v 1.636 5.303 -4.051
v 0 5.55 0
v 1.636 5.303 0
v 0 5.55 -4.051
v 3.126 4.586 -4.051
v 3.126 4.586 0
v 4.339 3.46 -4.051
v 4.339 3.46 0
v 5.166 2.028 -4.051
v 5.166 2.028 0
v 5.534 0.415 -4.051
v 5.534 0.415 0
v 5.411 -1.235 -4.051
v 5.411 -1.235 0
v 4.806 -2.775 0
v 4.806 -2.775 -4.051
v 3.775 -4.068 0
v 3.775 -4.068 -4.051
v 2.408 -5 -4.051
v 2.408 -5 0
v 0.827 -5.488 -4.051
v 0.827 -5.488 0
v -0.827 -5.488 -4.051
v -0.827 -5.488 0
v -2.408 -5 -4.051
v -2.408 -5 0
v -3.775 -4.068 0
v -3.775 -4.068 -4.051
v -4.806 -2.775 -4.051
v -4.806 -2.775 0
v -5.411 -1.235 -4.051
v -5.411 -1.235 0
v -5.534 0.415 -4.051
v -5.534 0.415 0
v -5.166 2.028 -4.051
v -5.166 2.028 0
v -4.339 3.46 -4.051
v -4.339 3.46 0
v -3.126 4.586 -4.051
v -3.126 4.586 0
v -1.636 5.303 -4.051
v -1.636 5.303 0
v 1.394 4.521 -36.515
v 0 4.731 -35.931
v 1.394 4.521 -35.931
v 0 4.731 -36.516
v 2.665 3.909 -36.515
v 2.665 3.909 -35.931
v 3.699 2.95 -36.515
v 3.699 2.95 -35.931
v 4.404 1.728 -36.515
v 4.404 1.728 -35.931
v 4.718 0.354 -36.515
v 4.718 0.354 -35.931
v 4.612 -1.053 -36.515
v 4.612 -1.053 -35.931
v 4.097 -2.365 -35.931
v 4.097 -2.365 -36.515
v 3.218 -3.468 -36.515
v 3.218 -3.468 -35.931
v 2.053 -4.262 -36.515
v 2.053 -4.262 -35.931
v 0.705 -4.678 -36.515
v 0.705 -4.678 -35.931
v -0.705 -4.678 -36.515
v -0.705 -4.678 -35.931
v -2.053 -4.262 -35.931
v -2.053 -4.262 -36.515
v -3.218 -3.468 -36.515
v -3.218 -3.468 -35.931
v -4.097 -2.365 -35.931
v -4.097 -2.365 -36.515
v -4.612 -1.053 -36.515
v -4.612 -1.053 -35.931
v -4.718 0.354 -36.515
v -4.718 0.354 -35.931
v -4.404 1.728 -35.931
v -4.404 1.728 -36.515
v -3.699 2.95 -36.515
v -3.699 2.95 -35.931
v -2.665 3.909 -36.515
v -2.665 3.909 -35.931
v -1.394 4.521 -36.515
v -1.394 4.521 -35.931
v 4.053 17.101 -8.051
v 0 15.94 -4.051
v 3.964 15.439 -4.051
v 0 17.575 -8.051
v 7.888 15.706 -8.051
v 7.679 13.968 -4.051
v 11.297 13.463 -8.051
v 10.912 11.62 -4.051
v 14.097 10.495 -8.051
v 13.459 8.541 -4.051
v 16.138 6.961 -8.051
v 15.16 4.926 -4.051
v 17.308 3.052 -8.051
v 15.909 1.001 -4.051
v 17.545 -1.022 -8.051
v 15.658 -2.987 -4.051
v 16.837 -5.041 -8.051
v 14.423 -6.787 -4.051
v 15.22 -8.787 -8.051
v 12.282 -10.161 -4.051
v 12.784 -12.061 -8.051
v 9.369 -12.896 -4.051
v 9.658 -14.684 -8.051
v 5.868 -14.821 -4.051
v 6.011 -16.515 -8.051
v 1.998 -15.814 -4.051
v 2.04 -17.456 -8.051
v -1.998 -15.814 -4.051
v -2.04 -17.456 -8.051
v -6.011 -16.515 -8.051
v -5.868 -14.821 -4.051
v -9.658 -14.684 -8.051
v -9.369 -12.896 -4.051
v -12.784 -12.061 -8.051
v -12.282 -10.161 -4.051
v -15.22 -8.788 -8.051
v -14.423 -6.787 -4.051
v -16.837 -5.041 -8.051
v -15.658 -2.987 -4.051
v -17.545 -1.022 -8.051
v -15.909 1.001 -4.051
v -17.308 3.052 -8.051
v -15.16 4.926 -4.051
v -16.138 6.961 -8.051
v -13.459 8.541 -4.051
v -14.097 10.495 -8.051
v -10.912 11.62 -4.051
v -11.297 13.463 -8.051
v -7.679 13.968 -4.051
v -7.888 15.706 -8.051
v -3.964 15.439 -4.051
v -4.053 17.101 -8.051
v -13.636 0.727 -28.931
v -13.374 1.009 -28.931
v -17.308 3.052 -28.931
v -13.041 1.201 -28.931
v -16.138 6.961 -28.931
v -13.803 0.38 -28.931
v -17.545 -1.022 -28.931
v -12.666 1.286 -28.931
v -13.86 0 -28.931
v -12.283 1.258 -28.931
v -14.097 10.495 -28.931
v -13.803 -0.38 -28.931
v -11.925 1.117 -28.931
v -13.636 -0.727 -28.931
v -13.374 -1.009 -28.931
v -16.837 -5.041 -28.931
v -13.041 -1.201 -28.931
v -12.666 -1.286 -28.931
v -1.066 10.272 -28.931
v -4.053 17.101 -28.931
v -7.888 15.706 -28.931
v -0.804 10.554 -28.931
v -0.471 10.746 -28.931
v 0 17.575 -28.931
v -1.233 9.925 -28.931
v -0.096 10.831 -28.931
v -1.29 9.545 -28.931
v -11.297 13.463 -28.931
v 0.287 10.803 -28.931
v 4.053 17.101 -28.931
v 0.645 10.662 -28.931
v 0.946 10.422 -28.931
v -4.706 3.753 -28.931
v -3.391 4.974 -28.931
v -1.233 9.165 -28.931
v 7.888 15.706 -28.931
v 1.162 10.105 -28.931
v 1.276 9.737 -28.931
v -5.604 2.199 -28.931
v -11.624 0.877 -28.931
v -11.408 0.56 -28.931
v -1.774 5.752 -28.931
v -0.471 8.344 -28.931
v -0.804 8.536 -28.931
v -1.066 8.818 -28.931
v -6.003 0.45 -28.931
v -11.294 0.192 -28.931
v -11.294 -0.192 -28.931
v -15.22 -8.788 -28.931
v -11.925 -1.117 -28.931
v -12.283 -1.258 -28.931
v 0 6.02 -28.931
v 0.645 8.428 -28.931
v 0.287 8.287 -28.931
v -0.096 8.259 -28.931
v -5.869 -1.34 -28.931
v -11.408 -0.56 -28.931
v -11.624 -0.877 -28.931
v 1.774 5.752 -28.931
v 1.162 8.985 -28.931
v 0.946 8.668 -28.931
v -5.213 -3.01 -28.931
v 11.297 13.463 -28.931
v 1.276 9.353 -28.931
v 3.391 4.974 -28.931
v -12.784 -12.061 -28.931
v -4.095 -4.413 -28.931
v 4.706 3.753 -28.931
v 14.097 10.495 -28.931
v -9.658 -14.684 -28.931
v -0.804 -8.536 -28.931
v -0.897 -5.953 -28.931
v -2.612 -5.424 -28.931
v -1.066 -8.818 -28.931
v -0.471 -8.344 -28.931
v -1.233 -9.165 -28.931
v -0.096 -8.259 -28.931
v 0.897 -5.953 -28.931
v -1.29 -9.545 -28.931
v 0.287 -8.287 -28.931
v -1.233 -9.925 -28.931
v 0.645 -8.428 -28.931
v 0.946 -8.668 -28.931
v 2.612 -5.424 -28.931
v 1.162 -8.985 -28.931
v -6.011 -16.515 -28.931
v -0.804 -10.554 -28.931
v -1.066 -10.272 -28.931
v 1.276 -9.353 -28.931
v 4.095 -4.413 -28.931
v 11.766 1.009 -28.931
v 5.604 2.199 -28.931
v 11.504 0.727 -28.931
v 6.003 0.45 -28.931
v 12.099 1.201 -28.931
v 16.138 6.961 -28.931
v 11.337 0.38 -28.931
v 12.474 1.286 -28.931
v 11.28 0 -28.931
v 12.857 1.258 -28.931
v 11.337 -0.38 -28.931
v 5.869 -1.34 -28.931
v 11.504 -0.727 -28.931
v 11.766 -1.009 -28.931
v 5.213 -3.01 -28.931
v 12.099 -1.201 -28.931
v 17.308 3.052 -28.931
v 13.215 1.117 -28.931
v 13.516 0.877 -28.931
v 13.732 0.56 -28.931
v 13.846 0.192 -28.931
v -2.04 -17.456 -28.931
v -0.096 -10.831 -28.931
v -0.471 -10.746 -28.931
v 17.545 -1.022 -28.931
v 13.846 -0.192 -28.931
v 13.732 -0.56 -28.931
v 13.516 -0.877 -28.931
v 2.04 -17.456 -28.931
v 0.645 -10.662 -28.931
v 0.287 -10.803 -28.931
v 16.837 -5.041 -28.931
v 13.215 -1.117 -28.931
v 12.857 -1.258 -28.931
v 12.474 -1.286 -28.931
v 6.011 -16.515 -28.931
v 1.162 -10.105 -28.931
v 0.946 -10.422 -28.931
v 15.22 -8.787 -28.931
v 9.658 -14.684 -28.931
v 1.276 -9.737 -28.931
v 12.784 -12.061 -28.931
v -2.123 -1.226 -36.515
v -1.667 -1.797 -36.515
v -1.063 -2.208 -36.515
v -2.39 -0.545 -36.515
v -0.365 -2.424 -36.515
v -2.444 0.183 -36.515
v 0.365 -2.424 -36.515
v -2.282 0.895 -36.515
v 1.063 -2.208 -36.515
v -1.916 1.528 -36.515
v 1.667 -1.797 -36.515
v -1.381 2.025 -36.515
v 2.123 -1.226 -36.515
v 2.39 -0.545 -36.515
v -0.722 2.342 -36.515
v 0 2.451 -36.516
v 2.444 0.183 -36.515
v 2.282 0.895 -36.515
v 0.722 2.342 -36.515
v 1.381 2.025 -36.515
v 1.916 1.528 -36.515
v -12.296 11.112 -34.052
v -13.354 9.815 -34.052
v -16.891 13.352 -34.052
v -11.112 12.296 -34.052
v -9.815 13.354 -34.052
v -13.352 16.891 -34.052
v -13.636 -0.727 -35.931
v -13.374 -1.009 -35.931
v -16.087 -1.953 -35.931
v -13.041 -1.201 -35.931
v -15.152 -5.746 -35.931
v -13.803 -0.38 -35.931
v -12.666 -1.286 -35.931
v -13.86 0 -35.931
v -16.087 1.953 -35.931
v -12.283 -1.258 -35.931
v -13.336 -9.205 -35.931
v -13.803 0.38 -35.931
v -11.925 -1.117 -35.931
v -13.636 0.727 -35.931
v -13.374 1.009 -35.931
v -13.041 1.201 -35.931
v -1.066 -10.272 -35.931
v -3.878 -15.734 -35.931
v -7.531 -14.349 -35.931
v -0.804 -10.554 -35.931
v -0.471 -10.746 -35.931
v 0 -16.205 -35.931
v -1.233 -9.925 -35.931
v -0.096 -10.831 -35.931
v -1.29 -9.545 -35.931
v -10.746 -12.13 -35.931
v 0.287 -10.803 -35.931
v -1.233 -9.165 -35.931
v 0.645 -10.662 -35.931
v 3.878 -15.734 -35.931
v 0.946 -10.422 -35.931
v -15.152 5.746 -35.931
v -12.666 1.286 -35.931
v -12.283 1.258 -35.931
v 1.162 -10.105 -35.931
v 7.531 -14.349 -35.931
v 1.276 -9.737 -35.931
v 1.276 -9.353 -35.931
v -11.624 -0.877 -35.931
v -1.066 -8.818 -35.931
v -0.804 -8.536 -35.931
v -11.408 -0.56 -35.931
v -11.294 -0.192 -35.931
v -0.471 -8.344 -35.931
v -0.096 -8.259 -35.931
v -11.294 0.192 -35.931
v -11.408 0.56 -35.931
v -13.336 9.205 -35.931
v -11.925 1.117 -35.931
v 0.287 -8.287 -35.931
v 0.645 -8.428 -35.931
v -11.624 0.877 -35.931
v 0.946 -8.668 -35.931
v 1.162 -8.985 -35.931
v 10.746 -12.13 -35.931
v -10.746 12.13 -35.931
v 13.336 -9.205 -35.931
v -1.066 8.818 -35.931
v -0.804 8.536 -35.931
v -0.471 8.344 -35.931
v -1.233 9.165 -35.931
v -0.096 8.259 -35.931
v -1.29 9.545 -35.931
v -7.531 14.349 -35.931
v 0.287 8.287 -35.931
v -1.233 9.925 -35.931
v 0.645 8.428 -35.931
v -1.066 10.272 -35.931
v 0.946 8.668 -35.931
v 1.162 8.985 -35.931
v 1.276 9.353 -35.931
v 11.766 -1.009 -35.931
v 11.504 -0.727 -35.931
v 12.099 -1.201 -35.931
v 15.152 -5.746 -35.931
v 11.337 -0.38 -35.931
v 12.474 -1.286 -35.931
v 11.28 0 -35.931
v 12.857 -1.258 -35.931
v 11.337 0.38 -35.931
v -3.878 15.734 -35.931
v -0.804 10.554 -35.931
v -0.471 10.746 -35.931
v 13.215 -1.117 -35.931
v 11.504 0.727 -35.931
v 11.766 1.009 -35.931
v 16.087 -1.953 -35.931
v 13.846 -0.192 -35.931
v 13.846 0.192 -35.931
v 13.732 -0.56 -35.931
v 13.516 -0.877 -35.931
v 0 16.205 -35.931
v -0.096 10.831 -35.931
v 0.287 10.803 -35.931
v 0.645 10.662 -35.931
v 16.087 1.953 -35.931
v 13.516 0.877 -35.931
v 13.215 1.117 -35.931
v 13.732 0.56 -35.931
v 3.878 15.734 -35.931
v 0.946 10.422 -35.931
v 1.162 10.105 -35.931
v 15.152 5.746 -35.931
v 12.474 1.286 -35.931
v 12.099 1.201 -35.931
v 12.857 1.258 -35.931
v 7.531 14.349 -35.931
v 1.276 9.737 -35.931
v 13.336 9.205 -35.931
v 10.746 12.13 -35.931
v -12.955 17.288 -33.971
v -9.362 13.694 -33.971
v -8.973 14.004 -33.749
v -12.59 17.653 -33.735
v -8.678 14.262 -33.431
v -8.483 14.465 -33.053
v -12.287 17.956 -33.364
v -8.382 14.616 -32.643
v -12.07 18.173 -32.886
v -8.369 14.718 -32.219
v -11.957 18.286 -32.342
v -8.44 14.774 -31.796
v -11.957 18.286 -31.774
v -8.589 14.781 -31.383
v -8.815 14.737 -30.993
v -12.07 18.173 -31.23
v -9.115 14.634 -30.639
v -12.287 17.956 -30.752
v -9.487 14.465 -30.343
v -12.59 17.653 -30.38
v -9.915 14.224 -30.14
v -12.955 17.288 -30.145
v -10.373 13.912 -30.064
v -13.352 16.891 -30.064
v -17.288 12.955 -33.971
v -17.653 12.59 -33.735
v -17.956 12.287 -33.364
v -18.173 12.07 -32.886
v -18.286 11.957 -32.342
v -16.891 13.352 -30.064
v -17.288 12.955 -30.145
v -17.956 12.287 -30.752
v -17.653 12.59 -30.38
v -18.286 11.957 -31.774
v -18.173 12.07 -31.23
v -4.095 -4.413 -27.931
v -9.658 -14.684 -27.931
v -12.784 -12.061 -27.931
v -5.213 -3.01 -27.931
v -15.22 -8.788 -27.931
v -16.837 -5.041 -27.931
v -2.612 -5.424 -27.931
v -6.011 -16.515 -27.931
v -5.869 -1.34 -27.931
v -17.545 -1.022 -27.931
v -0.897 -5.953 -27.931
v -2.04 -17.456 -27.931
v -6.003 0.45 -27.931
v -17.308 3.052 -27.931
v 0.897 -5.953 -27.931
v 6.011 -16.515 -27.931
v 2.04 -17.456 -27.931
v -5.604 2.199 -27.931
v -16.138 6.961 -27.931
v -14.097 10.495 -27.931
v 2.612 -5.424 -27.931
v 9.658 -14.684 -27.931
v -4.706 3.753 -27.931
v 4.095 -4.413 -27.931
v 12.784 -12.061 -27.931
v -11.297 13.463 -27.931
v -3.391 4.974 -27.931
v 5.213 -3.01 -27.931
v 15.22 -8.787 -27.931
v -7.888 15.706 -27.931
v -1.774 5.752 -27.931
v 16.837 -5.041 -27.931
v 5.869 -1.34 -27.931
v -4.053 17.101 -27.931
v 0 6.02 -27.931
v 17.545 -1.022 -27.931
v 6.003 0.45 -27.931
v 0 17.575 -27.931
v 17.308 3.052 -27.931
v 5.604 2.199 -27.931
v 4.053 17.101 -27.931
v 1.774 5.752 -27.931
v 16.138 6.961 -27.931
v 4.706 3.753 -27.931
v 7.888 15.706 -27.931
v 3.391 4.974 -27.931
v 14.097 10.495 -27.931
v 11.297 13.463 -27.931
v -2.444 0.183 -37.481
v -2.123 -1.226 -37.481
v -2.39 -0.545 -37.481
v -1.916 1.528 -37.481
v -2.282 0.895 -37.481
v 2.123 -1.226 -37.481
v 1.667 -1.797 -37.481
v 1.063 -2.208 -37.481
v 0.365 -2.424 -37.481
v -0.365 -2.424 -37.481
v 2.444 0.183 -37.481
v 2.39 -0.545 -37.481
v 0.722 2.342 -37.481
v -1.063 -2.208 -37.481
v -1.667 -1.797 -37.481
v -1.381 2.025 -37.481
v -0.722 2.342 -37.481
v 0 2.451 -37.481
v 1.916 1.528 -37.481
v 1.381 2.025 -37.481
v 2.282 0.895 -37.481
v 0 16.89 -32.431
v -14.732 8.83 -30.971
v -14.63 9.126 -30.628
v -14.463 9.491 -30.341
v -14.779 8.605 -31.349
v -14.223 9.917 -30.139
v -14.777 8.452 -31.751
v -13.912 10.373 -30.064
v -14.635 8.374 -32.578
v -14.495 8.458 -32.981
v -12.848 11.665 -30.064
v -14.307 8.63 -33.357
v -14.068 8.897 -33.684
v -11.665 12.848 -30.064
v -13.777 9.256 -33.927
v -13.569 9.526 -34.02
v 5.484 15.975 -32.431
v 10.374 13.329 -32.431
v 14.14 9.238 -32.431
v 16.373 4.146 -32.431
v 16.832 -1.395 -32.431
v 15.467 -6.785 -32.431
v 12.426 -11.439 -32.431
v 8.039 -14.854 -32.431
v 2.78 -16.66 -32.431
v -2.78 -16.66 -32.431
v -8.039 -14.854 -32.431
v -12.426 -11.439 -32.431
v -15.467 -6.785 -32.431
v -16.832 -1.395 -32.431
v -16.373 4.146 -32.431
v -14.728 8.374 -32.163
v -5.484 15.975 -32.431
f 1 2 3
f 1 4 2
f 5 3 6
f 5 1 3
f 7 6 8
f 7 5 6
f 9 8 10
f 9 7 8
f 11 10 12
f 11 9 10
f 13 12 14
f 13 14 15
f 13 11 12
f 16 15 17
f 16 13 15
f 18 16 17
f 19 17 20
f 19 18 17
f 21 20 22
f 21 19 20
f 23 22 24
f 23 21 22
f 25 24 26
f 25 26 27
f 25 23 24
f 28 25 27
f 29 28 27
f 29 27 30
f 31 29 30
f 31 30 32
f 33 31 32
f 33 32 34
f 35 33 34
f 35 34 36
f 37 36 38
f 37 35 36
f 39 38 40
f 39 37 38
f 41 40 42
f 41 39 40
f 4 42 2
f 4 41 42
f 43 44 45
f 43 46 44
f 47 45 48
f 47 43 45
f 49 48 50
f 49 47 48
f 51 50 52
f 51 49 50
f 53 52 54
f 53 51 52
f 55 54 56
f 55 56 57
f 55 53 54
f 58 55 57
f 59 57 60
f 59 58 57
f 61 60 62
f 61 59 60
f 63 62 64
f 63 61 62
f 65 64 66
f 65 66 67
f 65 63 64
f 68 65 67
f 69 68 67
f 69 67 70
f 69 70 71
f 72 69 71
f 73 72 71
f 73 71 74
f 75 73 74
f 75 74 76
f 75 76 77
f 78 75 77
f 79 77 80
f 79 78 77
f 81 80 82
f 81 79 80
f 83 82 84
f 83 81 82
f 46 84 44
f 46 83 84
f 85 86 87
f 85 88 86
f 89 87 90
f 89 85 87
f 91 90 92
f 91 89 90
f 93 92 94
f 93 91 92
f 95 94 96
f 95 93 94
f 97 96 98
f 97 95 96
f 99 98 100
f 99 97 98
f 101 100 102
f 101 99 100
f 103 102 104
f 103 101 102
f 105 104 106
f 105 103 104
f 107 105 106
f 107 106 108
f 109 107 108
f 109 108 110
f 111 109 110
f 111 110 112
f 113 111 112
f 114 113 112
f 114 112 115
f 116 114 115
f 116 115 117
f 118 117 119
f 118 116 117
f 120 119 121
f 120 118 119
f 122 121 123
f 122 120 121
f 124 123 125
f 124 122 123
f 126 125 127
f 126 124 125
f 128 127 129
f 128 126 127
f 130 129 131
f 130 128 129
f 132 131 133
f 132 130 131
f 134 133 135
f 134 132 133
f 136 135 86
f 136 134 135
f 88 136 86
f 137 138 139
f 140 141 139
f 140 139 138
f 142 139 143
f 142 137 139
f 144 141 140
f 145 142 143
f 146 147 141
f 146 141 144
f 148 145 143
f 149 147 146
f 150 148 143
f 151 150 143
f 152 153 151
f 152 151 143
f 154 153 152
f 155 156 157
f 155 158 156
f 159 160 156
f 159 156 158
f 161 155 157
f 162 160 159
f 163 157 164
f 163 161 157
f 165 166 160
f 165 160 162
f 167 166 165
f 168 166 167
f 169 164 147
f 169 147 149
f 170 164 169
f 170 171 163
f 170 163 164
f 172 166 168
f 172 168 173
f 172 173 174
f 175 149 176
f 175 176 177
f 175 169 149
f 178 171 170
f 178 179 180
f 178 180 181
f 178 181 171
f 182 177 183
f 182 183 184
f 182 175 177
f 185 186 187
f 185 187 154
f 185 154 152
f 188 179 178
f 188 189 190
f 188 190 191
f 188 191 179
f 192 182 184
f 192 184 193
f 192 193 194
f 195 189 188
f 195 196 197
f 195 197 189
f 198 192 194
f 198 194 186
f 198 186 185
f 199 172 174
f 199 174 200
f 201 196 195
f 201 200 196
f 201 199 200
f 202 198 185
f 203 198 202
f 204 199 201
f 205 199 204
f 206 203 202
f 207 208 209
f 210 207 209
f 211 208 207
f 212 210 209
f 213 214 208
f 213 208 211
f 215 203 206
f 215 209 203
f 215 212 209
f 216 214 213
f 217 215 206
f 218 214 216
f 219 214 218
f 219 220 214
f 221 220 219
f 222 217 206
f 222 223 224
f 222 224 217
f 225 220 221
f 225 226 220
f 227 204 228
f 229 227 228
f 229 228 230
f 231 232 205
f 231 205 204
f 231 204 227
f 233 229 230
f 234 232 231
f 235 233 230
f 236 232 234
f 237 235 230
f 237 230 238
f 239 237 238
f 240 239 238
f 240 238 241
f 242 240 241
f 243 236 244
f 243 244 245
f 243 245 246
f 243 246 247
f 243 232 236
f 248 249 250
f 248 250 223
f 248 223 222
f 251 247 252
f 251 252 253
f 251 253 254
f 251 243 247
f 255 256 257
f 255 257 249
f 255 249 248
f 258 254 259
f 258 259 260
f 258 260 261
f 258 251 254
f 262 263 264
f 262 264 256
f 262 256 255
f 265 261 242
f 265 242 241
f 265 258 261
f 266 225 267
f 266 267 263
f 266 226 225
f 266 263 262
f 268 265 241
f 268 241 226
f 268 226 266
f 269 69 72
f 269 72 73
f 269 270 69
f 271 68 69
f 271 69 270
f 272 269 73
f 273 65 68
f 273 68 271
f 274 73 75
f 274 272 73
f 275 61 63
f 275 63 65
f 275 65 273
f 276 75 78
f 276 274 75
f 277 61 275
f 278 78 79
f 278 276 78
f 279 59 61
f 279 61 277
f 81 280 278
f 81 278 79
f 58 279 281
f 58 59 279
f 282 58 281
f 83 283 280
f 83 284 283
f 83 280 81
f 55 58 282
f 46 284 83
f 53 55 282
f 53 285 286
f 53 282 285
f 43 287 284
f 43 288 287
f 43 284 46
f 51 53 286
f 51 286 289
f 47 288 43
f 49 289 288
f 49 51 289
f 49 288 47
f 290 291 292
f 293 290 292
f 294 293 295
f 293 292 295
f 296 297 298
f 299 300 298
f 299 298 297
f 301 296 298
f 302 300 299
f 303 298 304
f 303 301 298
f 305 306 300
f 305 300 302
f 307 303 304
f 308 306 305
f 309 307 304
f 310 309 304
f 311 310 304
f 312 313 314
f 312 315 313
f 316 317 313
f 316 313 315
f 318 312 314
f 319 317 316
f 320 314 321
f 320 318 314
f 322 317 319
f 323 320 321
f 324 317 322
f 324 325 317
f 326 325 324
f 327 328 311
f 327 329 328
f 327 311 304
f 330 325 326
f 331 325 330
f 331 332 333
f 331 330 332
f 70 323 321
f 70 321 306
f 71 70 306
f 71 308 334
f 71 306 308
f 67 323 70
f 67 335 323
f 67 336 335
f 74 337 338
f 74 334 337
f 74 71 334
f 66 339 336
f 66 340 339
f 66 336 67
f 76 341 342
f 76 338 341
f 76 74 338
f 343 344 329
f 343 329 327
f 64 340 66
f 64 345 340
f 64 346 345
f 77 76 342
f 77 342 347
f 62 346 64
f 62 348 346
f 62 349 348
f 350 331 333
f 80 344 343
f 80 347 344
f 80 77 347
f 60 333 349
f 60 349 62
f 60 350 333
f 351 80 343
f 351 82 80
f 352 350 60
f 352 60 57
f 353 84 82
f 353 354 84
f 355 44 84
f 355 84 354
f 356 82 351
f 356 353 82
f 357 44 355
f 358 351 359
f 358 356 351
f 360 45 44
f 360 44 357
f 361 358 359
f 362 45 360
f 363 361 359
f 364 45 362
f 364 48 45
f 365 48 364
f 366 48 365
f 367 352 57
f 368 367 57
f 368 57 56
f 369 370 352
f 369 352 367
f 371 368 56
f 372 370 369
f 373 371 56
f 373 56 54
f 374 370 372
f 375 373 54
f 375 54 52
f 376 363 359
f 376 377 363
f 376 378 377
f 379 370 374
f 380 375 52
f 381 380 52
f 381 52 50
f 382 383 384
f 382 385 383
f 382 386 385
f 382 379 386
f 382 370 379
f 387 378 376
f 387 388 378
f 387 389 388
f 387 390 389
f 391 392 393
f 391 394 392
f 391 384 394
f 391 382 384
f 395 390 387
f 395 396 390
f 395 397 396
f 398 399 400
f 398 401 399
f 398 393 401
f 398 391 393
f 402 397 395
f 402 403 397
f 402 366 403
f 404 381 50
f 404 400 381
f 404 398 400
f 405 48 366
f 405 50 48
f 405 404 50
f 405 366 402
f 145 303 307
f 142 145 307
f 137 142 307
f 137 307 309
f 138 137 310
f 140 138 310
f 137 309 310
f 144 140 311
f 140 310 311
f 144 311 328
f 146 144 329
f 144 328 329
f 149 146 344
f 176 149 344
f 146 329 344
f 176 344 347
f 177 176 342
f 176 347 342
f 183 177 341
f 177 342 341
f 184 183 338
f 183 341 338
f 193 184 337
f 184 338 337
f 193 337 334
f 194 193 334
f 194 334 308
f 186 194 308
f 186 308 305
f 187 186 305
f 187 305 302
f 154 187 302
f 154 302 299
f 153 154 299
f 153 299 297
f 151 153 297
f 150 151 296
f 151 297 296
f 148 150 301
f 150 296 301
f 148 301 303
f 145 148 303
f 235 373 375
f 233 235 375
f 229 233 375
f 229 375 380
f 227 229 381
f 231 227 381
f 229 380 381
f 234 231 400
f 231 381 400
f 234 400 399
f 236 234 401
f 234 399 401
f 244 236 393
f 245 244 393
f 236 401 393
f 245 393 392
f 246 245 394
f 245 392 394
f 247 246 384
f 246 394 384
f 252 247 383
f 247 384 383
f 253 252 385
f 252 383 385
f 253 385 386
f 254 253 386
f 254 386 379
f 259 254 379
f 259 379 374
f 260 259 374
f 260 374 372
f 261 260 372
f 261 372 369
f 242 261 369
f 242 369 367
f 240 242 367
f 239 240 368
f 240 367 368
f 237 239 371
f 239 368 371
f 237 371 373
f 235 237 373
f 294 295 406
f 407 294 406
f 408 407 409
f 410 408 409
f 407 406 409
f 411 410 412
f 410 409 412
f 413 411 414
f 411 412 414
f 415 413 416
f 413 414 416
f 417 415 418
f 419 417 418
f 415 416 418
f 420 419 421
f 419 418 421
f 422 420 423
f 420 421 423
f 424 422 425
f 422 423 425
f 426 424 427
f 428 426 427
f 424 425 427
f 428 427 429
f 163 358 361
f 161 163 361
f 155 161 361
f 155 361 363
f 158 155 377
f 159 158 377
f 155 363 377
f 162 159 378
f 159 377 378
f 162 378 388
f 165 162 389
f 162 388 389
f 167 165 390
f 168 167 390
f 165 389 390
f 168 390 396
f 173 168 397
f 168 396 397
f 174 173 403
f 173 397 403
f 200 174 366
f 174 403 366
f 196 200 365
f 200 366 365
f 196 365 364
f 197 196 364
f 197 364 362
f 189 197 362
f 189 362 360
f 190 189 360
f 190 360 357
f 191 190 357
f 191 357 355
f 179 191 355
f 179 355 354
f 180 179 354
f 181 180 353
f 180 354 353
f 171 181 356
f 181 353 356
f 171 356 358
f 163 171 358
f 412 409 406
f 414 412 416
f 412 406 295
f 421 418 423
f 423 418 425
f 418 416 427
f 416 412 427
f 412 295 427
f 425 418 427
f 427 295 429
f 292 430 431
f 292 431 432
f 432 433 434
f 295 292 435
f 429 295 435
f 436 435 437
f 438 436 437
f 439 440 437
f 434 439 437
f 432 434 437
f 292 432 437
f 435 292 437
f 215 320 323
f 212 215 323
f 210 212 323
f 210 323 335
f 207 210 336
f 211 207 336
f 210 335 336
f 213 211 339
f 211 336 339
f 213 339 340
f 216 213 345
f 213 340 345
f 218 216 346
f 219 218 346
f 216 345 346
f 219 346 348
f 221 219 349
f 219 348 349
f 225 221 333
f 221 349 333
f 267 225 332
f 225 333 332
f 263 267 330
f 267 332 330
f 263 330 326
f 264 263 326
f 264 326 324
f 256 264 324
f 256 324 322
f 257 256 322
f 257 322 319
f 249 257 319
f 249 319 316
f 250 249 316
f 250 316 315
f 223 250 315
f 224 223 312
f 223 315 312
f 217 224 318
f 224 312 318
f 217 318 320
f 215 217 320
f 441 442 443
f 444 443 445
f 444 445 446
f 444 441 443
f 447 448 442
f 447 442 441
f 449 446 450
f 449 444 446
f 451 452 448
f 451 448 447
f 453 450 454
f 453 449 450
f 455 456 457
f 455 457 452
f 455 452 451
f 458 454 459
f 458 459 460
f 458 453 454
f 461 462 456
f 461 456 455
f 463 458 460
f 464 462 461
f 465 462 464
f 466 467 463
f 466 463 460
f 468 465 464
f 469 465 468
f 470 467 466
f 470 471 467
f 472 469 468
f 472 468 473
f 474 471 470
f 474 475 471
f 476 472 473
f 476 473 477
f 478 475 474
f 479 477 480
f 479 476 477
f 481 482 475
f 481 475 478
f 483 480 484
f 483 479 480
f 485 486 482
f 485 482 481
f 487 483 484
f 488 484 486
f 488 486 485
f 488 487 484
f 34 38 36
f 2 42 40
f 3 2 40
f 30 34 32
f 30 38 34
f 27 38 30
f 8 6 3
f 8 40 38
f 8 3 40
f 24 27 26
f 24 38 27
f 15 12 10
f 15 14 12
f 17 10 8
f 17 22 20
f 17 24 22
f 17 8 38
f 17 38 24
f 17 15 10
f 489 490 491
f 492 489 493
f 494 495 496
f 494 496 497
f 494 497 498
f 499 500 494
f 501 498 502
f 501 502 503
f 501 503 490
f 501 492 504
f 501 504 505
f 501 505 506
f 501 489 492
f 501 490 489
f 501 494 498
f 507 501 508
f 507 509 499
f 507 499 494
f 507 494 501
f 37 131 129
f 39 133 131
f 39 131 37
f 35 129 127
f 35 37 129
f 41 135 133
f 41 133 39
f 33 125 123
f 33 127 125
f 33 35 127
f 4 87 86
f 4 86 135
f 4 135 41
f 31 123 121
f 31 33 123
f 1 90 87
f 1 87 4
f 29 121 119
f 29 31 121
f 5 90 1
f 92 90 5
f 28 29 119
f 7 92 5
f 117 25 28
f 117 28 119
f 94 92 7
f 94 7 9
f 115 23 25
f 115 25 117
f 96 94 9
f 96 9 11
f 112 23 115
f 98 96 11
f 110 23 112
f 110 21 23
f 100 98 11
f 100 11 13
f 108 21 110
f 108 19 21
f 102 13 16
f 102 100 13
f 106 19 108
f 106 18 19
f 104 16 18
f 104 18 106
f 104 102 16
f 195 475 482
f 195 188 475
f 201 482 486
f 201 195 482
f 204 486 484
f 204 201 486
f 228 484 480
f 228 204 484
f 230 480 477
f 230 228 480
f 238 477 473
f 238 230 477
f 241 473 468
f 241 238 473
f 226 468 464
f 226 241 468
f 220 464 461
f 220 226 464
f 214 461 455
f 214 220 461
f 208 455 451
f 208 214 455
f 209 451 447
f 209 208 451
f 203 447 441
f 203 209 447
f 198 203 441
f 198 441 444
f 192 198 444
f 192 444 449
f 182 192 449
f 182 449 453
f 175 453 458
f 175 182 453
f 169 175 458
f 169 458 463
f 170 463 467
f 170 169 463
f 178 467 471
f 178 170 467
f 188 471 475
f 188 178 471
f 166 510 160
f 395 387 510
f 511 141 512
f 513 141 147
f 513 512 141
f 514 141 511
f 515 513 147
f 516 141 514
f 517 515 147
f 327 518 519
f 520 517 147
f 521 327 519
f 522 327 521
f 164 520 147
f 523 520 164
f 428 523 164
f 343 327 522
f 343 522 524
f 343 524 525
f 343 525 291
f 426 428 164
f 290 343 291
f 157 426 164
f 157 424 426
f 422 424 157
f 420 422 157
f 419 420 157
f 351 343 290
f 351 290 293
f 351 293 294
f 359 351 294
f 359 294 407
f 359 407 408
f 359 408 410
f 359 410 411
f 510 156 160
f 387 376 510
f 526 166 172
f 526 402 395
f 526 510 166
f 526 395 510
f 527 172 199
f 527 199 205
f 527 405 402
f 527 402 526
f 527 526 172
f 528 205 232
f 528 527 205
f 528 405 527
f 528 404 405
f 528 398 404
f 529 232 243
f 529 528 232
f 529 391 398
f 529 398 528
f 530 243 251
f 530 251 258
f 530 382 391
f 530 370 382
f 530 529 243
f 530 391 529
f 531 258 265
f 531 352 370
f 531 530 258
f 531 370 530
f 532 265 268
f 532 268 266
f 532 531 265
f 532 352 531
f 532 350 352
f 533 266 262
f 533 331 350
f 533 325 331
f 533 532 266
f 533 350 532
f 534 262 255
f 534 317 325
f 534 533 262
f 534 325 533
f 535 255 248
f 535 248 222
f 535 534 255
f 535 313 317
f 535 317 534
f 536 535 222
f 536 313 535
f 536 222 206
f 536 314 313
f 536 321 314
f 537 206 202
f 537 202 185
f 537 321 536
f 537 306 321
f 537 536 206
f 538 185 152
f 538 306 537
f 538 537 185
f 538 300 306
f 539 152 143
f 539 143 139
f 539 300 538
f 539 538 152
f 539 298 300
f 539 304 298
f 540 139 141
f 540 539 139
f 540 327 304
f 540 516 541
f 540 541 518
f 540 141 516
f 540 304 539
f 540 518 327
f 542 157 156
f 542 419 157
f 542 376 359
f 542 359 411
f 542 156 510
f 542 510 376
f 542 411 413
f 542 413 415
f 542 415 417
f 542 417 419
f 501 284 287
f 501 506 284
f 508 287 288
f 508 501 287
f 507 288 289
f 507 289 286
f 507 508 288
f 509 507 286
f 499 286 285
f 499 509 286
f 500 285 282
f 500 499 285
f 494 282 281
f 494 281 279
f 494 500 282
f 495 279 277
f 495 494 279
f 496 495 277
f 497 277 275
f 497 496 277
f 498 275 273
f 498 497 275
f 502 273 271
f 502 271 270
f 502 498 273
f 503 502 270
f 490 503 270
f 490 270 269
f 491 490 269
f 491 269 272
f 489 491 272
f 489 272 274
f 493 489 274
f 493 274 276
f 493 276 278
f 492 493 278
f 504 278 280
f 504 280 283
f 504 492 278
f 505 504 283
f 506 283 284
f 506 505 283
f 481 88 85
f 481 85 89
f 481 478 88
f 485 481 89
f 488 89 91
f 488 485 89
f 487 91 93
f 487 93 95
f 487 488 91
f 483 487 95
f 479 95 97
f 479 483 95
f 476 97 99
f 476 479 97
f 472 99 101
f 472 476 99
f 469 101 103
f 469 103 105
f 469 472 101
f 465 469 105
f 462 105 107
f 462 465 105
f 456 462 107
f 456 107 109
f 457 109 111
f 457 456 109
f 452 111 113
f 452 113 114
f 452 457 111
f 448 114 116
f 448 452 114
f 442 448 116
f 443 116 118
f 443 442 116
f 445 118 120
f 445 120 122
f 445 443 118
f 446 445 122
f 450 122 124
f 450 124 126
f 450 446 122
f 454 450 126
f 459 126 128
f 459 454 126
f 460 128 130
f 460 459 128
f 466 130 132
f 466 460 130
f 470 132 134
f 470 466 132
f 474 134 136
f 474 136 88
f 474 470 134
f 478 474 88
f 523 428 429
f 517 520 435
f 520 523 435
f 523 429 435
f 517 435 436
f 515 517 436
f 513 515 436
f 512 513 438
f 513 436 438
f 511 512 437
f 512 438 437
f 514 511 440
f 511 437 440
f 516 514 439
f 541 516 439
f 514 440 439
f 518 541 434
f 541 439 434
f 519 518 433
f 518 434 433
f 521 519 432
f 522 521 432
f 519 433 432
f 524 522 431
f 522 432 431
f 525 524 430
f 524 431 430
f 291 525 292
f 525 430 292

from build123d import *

# Parameters (mm, degrees)
SKETCH2_R           = 1.29
CUT_EXTRUDE1_DEPTH  = 7
BOSS_EXTRUDE1_DEPTH = 3.81


with BuildPart() as part:
    # Sketch1 → Revolve1 (revolve)
    with BuildSketch(Plane(origin=(0, 0, 0), x_dir=(0, 0, -1), z_dir=(1, 0, 0))):
        Polygon((0, 0), (0, 5.5499), (4.0513, 5.5499), (4.0513, 15.94), (8.0513, 17.575), (27.9313, 17.575), (27.9313, 6.019833944), (28.9313, 6.019833944), (28.9313, 17.575), (35.9313, 16.205000102), (35.9313, 4.73075), (36.5155, 4.73075), (36.5155, 2.4511), (37.4807, 2.4511), (37.4807, 0), align=None)
    revolve(axis=Axis((0, 0, 1000), (0, 0, -1)))

    # Sketch2 → Cut-Extrude1 (cut)
    with BuildSketch(Plane(origin=(0, 0, -35.9313), x_dir=(-1, 0, 0), z_dir=(0, 0, -1))):
        with Locations((-12.57, 0)):
            Circle(SKETCH2_R)
        with Locations((0, 9.545)):
            Circle(SKETCH2_R)
        with Locations((12.57, 0)):
            Circle(SKETCH2_R)
        with Locations((0, -9.545)):
            Circle(SKETCH2_R)
    extrude(amount=-CUT_EXTRUDE1_DEPTH, mode=Mode.SUBTRACT)

    # Sketch3 → Boss-Extrude1 (add, symmetric)
    with BuildSketch(Plane(origin=(-12.427401679, 12.427401679, 0), x_dir=(0, 0, -1), z_dir=(-0.707106781, 0.707106781, 0))):
        with BuildLine():
            Line((34.0517, 2.5019), (34.0517, -2.5019))
            ThreePointArc((34.0517, -2.5019), (32.0578, -4.4958), (30.0639, -2.5019))
            Line((30.0639, -2.5019), (30.0639, 2.5019))
            ThreePointArc((30.0639, 2.5019), (32.0578, 4.4958), (34.0517, 2.5019))
        make_face()
    extrude(amount=BOSS_EXTRUDE1_DEPTH, both=True)


solid = part.part
